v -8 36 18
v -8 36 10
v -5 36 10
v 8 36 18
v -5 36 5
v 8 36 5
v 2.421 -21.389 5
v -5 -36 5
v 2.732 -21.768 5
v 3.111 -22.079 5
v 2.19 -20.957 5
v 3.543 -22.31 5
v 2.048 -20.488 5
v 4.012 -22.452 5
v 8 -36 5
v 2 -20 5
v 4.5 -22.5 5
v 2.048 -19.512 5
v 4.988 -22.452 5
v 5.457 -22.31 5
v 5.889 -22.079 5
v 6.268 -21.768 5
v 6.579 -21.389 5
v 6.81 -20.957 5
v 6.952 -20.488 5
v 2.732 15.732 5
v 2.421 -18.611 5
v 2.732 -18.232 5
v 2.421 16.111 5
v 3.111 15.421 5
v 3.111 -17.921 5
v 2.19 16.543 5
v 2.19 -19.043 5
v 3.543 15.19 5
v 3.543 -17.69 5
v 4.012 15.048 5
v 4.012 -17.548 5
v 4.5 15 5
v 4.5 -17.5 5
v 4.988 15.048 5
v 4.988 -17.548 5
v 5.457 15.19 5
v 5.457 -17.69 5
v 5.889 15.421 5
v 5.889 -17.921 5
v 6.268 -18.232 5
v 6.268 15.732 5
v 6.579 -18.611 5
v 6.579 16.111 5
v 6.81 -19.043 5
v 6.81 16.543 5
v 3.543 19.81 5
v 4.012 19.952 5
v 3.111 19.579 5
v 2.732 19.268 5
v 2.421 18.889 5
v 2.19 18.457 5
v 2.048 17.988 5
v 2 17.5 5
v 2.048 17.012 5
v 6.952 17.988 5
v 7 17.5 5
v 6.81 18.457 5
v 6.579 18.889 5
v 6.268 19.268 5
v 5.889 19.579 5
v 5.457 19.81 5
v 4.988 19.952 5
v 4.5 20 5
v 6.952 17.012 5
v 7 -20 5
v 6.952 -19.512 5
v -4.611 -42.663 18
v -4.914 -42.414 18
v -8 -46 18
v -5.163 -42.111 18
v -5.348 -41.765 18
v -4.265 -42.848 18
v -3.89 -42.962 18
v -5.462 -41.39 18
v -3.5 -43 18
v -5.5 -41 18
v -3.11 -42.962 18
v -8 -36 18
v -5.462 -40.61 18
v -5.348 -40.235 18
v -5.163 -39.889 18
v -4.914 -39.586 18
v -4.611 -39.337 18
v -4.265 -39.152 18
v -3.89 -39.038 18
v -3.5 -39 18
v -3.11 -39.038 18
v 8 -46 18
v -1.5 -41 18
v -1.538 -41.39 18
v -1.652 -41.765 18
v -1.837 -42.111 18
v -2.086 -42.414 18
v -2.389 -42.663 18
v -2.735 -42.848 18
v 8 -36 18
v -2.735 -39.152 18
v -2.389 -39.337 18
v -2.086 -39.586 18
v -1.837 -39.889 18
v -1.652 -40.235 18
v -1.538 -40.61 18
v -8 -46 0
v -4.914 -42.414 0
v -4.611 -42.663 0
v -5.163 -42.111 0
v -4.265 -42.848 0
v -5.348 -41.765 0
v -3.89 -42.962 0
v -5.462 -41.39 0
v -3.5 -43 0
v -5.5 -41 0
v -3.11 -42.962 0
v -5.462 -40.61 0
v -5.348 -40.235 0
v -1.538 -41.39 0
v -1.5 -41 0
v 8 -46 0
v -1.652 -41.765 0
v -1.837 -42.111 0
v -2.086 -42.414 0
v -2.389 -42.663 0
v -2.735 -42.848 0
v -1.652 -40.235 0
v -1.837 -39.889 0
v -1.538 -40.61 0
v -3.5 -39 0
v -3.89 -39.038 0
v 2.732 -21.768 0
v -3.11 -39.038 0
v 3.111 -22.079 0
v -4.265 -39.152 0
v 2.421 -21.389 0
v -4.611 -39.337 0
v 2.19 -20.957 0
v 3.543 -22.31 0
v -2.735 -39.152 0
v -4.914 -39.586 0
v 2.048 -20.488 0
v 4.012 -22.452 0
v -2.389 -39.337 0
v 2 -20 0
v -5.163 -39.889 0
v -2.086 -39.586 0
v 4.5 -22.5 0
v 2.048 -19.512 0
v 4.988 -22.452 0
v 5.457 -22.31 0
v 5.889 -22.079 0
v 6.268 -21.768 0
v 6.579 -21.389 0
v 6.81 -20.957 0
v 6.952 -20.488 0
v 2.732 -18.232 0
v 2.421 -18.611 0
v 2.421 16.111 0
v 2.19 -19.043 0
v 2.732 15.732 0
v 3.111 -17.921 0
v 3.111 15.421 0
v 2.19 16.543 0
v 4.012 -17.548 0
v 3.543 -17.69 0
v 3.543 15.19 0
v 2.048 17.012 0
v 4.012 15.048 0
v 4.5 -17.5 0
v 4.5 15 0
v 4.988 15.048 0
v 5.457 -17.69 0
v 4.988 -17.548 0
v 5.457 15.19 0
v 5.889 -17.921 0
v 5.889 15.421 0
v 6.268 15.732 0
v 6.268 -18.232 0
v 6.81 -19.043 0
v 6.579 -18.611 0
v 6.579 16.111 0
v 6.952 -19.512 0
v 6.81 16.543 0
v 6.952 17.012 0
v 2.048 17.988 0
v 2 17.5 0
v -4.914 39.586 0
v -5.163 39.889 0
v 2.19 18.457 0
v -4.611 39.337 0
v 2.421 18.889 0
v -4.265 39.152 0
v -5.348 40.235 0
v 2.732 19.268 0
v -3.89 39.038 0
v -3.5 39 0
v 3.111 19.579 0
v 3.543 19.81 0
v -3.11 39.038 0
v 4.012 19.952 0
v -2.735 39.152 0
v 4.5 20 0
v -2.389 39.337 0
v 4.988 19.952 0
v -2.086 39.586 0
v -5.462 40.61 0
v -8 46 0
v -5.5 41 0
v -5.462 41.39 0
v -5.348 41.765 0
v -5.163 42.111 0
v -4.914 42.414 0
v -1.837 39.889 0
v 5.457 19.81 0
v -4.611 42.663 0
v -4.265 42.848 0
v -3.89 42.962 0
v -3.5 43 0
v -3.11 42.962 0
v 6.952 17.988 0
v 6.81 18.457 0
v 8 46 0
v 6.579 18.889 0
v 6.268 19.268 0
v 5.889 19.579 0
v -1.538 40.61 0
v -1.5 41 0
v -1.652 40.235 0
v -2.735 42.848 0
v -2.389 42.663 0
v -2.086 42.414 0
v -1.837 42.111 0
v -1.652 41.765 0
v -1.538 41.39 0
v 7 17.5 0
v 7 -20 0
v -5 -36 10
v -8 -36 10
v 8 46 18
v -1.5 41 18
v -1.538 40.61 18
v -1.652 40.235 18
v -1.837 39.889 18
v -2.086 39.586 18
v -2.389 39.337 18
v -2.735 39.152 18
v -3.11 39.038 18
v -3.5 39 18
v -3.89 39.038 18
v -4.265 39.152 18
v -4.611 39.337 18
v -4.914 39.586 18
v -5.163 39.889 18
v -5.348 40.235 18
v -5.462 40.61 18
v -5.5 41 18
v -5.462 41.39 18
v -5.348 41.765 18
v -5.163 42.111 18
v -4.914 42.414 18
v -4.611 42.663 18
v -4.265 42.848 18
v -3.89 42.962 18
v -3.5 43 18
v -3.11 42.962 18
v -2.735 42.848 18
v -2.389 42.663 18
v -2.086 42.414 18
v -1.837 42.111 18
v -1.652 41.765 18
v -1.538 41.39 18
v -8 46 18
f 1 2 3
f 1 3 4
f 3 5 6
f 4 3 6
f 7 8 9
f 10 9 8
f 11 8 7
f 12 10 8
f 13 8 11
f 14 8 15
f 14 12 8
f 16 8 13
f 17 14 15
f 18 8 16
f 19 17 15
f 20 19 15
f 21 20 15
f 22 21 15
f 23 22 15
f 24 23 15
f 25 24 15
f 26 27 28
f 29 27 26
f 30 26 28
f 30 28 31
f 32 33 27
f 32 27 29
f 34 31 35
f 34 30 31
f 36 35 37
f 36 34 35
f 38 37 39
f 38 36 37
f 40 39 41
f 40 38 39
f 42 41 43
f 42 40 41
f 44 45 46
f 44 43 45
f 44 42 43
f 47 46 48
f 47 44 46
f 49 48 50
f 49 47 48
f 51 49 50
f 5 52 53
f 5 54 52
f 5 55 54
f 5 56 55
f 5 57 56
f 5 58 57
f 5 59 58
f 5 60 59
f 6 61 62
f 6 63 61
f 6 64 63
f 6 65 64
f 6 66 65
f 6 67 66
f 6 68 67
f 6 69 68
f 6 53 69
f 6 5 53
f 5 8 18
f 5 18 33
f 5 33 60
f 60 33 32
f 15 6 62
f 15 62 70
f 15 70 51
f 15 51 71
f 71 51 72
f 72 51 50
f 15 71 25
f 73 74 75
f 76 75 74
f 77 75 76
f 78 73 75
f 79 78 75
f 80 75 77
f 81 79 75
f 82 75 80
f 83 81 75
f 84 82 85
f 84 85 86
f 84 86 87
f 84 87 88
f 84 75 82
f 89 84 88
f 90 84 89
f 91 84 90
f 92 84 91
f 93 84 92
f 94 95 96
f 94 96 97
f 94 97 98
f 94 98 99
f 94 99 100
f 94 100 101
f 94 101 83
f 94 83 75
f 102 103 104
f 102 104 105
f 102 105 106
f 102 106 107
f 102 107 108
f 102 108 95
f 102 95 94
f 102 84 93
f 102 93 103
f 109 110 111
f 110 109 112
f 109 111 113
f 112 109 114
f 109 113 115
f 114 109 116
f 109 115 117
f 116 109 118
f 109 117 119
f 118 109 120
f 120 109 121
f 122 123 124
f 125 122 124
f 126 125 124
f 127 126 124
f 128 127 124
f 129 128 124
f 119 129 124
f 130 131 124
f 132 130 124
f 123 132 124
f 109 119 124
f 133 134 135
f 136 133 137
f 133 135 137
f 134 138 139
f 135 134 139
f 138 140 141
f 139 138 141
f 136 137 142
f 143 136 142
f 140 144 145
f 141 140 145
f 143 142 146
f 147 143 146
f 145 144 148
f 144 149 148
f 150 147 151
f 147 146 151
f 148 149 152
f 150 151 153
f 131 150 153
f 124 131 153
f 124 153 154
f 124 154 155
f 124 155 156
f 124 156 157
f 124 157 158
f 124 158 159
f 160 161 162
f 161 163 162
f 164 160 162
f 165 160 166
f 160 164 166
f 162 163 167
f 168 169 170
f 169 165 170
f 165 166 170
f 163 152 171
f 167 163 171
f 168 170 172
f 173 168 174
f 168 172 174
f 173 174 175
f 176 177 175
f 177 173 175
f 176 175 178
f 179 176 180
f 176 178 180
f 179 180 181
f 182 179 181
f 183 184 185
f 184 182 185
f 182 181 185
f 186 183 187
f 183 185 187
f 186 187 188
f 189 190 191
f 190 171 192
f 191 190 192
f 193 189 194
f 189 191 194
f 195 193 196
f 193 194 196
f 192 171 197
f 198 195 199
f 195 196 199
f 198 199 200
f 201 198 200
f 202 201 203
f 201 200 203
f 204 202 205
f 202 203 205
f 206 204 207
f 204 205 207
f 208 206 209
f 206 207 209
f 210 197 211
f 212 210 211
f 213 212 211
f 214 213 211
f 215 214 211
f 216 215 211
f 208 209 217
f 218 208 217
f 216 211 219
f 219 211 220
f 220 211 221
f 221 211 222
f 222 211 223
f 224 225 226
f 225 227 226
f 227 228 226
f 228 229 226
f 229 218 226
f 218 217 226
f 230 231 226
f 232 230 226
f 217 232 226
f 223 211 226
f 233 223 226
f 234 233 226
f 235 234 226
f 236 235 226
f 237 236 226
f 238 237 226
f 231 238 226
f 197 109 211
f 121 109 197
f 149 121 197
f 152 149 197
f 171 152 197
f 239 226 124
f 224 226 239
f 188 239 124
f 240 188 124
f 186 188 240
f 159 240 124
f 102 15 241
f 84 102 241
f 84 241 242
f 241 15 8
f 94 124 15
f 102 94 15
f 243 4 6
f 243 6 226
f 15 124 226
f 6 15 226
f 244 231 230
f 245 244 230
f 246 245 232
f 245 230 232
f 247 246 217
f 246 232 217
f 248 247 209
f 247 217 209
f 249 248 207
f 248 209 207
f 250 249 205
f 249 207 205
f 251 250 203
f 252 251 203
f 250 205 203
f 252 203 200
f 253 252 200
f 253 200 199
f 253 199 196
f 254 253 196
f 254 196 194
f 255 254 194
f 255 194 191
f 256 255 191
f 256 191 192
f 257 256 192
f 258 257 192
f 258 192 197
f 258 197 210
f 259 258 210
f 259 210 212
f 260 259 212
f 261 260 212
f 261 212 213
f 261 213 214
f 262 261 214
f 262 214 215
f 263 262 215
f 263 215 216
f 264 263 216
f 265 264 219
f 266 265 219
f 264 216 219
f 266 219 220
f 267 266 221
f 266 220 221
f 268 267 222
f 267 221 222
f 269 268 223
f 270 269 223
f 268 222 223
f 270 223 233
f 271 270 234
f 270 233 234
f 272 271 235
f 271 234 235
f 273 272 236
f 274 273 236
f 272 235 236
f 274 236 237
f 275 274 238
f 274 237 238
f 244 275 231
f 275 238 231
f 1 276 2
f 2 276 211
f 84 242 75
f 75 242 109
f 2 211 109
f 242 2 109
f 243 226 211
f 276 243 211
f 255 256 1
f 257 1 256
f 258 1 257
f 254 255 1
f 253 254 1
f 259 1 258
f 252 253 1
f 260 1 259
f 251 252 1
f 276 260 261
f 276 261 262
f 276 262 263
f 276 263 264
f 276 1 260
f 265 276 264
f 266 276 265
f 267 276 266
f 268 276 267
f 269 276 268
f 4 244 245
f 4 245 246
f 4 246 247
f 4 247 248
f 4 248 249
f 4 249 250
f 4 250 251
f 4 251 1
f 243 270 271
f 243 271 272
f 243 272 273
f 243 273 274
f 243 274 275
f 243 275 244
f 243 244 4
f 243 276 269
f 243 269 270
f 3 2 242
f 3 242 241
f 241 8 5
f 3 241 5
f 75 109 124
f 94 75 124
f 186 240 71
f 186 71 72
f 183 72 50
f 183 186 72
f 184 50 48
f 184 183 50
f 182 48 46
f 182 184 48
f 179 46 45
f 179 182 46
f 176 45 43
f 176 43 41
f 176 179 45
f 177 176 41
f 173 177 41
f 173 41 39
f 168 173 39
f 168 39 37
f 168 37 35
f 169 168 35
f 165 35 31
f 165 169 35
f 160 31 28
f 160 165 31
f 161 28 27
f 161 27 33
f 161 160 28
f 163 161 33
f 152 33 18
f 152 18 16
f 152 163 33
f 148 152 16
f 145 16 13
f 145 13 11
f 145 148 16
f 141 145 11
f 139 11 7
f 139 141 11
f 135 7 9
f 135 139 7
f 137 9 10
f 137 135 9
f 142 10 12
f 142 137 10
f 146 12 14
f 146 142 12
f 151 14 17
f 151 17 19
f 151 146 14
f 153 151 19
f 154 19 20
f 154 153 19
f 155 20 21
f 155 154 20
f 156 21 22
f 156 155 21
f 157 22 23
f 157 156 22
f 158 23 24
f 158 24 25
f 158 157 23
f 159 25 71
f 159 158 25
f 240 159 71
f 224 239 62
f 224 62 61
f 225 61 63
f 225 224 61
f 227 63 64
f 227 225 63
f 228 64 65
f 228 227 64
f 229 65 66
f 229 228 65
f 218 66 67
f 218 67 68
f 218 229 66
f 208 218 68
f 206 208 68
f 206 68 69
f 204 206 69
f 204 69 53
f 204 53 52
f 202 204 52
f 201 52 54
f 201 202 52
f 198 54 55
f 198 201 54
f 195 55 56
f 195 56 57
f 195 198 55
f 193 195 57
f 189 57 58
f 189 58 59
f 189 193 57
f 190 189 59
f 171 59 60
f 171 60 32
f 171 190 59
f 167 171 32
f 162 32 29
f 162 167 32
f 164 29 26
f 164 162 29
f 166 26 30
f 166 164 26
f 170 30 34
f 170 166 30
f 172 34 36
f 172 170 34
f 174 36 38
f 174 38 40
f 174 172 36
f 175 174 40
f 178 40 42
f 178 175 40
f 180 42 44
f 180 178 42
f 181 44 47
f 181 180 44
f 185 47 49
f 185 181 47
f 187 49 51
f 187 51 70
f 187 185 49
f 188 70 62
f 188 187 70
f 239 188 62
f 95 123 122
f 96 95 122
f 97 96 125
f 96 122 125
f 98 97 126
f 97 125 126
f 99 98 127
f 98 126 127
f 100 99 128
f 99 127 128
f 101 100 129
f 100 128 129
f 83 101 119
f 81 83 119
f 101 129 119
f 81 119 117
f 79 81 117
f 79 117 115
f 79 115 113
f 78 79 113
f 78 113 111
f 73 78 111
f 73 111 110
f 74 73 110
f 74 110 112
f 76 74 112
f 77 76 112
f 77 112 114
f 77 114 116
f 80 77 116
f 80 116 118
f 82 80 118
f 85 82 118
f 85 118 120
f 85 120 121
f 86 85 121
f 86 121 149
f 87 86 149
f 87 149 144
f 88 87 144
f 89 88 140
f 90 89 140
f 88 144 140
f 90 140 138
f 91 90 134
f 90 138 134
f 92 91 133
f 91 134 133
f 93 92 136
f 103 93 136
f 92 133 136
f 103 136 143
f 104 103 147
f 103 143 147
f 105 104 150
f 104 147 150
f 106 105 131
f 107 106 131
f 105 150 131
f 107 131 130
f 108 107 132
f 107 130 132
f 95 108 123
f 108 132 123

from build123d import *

# Parameters (mm, degrees)
F0_W     = 16
F0_H     = 92
F0_R     = 2.5
F1_DEPTH = 5
F3_DEPTH = 13
F2_W     = 3
F2_H     = 72
F4_DEPTH = 5
F5_R     = 2
F6_DEPTH = 25


with BuildPart() as f1:
    # F0 (on Top) → F1 (new body)
    with BuildSketch(Plane.XY):
        Rectangle(F0_W, F0_H)
        with Locations((4.5, -20)):
            Circle(F0_R, mode=Mode.SUBTRACT)
        with Locations((4.5, 17.5)):
            Circle(F0_R, mode=Mode.SUBTRACT)
    extrude(amount=F1_DEPTH)

    # F2 (on face) → F3 (join)
    with BuildSketch(Plane.XY.offset(5)):
        Polygon((-5, -36), (-8, -36), (-8, -46), (8, -46), (8, -36), align=None)
        Polygon((8, 46), (-8, 46), (-8, 36), (-5, 36), (8, 36), align=None)
    extrude(amount=F3_DEPTH)

    # F2 (on face) → F4 (join)
    with BuildSketch(Plane.XY.offset(5)):
        Polygon((8, 46), (-8, 46), (-8, 36), (-5, 36), (8, 36), align=None)
        with Locations((-6.5, 0)):
            Rectangle(F2_W, F2_H)
        Polygon((-5, -36), (-8, -36), (-8, -46), (8, -46), (8, -36), align=None)
    extrude(amount=F4_DEPTH)

    # F5 (on face) → F6 (cut)
    with BuildSketch(Plane(origin=(0, 0, 0), x_dir=(1, 0, 0), z_dir=(0, 0, -1))):
        with Locations((-3.5, -41)):
            Circle(F5_R)
        with Locations((-3.5, 41)):
            Circle(F5_R)
    extrude(amount=-F6_DEPTH, mode=Mode.SUBTRACT)


solid = f1.part
